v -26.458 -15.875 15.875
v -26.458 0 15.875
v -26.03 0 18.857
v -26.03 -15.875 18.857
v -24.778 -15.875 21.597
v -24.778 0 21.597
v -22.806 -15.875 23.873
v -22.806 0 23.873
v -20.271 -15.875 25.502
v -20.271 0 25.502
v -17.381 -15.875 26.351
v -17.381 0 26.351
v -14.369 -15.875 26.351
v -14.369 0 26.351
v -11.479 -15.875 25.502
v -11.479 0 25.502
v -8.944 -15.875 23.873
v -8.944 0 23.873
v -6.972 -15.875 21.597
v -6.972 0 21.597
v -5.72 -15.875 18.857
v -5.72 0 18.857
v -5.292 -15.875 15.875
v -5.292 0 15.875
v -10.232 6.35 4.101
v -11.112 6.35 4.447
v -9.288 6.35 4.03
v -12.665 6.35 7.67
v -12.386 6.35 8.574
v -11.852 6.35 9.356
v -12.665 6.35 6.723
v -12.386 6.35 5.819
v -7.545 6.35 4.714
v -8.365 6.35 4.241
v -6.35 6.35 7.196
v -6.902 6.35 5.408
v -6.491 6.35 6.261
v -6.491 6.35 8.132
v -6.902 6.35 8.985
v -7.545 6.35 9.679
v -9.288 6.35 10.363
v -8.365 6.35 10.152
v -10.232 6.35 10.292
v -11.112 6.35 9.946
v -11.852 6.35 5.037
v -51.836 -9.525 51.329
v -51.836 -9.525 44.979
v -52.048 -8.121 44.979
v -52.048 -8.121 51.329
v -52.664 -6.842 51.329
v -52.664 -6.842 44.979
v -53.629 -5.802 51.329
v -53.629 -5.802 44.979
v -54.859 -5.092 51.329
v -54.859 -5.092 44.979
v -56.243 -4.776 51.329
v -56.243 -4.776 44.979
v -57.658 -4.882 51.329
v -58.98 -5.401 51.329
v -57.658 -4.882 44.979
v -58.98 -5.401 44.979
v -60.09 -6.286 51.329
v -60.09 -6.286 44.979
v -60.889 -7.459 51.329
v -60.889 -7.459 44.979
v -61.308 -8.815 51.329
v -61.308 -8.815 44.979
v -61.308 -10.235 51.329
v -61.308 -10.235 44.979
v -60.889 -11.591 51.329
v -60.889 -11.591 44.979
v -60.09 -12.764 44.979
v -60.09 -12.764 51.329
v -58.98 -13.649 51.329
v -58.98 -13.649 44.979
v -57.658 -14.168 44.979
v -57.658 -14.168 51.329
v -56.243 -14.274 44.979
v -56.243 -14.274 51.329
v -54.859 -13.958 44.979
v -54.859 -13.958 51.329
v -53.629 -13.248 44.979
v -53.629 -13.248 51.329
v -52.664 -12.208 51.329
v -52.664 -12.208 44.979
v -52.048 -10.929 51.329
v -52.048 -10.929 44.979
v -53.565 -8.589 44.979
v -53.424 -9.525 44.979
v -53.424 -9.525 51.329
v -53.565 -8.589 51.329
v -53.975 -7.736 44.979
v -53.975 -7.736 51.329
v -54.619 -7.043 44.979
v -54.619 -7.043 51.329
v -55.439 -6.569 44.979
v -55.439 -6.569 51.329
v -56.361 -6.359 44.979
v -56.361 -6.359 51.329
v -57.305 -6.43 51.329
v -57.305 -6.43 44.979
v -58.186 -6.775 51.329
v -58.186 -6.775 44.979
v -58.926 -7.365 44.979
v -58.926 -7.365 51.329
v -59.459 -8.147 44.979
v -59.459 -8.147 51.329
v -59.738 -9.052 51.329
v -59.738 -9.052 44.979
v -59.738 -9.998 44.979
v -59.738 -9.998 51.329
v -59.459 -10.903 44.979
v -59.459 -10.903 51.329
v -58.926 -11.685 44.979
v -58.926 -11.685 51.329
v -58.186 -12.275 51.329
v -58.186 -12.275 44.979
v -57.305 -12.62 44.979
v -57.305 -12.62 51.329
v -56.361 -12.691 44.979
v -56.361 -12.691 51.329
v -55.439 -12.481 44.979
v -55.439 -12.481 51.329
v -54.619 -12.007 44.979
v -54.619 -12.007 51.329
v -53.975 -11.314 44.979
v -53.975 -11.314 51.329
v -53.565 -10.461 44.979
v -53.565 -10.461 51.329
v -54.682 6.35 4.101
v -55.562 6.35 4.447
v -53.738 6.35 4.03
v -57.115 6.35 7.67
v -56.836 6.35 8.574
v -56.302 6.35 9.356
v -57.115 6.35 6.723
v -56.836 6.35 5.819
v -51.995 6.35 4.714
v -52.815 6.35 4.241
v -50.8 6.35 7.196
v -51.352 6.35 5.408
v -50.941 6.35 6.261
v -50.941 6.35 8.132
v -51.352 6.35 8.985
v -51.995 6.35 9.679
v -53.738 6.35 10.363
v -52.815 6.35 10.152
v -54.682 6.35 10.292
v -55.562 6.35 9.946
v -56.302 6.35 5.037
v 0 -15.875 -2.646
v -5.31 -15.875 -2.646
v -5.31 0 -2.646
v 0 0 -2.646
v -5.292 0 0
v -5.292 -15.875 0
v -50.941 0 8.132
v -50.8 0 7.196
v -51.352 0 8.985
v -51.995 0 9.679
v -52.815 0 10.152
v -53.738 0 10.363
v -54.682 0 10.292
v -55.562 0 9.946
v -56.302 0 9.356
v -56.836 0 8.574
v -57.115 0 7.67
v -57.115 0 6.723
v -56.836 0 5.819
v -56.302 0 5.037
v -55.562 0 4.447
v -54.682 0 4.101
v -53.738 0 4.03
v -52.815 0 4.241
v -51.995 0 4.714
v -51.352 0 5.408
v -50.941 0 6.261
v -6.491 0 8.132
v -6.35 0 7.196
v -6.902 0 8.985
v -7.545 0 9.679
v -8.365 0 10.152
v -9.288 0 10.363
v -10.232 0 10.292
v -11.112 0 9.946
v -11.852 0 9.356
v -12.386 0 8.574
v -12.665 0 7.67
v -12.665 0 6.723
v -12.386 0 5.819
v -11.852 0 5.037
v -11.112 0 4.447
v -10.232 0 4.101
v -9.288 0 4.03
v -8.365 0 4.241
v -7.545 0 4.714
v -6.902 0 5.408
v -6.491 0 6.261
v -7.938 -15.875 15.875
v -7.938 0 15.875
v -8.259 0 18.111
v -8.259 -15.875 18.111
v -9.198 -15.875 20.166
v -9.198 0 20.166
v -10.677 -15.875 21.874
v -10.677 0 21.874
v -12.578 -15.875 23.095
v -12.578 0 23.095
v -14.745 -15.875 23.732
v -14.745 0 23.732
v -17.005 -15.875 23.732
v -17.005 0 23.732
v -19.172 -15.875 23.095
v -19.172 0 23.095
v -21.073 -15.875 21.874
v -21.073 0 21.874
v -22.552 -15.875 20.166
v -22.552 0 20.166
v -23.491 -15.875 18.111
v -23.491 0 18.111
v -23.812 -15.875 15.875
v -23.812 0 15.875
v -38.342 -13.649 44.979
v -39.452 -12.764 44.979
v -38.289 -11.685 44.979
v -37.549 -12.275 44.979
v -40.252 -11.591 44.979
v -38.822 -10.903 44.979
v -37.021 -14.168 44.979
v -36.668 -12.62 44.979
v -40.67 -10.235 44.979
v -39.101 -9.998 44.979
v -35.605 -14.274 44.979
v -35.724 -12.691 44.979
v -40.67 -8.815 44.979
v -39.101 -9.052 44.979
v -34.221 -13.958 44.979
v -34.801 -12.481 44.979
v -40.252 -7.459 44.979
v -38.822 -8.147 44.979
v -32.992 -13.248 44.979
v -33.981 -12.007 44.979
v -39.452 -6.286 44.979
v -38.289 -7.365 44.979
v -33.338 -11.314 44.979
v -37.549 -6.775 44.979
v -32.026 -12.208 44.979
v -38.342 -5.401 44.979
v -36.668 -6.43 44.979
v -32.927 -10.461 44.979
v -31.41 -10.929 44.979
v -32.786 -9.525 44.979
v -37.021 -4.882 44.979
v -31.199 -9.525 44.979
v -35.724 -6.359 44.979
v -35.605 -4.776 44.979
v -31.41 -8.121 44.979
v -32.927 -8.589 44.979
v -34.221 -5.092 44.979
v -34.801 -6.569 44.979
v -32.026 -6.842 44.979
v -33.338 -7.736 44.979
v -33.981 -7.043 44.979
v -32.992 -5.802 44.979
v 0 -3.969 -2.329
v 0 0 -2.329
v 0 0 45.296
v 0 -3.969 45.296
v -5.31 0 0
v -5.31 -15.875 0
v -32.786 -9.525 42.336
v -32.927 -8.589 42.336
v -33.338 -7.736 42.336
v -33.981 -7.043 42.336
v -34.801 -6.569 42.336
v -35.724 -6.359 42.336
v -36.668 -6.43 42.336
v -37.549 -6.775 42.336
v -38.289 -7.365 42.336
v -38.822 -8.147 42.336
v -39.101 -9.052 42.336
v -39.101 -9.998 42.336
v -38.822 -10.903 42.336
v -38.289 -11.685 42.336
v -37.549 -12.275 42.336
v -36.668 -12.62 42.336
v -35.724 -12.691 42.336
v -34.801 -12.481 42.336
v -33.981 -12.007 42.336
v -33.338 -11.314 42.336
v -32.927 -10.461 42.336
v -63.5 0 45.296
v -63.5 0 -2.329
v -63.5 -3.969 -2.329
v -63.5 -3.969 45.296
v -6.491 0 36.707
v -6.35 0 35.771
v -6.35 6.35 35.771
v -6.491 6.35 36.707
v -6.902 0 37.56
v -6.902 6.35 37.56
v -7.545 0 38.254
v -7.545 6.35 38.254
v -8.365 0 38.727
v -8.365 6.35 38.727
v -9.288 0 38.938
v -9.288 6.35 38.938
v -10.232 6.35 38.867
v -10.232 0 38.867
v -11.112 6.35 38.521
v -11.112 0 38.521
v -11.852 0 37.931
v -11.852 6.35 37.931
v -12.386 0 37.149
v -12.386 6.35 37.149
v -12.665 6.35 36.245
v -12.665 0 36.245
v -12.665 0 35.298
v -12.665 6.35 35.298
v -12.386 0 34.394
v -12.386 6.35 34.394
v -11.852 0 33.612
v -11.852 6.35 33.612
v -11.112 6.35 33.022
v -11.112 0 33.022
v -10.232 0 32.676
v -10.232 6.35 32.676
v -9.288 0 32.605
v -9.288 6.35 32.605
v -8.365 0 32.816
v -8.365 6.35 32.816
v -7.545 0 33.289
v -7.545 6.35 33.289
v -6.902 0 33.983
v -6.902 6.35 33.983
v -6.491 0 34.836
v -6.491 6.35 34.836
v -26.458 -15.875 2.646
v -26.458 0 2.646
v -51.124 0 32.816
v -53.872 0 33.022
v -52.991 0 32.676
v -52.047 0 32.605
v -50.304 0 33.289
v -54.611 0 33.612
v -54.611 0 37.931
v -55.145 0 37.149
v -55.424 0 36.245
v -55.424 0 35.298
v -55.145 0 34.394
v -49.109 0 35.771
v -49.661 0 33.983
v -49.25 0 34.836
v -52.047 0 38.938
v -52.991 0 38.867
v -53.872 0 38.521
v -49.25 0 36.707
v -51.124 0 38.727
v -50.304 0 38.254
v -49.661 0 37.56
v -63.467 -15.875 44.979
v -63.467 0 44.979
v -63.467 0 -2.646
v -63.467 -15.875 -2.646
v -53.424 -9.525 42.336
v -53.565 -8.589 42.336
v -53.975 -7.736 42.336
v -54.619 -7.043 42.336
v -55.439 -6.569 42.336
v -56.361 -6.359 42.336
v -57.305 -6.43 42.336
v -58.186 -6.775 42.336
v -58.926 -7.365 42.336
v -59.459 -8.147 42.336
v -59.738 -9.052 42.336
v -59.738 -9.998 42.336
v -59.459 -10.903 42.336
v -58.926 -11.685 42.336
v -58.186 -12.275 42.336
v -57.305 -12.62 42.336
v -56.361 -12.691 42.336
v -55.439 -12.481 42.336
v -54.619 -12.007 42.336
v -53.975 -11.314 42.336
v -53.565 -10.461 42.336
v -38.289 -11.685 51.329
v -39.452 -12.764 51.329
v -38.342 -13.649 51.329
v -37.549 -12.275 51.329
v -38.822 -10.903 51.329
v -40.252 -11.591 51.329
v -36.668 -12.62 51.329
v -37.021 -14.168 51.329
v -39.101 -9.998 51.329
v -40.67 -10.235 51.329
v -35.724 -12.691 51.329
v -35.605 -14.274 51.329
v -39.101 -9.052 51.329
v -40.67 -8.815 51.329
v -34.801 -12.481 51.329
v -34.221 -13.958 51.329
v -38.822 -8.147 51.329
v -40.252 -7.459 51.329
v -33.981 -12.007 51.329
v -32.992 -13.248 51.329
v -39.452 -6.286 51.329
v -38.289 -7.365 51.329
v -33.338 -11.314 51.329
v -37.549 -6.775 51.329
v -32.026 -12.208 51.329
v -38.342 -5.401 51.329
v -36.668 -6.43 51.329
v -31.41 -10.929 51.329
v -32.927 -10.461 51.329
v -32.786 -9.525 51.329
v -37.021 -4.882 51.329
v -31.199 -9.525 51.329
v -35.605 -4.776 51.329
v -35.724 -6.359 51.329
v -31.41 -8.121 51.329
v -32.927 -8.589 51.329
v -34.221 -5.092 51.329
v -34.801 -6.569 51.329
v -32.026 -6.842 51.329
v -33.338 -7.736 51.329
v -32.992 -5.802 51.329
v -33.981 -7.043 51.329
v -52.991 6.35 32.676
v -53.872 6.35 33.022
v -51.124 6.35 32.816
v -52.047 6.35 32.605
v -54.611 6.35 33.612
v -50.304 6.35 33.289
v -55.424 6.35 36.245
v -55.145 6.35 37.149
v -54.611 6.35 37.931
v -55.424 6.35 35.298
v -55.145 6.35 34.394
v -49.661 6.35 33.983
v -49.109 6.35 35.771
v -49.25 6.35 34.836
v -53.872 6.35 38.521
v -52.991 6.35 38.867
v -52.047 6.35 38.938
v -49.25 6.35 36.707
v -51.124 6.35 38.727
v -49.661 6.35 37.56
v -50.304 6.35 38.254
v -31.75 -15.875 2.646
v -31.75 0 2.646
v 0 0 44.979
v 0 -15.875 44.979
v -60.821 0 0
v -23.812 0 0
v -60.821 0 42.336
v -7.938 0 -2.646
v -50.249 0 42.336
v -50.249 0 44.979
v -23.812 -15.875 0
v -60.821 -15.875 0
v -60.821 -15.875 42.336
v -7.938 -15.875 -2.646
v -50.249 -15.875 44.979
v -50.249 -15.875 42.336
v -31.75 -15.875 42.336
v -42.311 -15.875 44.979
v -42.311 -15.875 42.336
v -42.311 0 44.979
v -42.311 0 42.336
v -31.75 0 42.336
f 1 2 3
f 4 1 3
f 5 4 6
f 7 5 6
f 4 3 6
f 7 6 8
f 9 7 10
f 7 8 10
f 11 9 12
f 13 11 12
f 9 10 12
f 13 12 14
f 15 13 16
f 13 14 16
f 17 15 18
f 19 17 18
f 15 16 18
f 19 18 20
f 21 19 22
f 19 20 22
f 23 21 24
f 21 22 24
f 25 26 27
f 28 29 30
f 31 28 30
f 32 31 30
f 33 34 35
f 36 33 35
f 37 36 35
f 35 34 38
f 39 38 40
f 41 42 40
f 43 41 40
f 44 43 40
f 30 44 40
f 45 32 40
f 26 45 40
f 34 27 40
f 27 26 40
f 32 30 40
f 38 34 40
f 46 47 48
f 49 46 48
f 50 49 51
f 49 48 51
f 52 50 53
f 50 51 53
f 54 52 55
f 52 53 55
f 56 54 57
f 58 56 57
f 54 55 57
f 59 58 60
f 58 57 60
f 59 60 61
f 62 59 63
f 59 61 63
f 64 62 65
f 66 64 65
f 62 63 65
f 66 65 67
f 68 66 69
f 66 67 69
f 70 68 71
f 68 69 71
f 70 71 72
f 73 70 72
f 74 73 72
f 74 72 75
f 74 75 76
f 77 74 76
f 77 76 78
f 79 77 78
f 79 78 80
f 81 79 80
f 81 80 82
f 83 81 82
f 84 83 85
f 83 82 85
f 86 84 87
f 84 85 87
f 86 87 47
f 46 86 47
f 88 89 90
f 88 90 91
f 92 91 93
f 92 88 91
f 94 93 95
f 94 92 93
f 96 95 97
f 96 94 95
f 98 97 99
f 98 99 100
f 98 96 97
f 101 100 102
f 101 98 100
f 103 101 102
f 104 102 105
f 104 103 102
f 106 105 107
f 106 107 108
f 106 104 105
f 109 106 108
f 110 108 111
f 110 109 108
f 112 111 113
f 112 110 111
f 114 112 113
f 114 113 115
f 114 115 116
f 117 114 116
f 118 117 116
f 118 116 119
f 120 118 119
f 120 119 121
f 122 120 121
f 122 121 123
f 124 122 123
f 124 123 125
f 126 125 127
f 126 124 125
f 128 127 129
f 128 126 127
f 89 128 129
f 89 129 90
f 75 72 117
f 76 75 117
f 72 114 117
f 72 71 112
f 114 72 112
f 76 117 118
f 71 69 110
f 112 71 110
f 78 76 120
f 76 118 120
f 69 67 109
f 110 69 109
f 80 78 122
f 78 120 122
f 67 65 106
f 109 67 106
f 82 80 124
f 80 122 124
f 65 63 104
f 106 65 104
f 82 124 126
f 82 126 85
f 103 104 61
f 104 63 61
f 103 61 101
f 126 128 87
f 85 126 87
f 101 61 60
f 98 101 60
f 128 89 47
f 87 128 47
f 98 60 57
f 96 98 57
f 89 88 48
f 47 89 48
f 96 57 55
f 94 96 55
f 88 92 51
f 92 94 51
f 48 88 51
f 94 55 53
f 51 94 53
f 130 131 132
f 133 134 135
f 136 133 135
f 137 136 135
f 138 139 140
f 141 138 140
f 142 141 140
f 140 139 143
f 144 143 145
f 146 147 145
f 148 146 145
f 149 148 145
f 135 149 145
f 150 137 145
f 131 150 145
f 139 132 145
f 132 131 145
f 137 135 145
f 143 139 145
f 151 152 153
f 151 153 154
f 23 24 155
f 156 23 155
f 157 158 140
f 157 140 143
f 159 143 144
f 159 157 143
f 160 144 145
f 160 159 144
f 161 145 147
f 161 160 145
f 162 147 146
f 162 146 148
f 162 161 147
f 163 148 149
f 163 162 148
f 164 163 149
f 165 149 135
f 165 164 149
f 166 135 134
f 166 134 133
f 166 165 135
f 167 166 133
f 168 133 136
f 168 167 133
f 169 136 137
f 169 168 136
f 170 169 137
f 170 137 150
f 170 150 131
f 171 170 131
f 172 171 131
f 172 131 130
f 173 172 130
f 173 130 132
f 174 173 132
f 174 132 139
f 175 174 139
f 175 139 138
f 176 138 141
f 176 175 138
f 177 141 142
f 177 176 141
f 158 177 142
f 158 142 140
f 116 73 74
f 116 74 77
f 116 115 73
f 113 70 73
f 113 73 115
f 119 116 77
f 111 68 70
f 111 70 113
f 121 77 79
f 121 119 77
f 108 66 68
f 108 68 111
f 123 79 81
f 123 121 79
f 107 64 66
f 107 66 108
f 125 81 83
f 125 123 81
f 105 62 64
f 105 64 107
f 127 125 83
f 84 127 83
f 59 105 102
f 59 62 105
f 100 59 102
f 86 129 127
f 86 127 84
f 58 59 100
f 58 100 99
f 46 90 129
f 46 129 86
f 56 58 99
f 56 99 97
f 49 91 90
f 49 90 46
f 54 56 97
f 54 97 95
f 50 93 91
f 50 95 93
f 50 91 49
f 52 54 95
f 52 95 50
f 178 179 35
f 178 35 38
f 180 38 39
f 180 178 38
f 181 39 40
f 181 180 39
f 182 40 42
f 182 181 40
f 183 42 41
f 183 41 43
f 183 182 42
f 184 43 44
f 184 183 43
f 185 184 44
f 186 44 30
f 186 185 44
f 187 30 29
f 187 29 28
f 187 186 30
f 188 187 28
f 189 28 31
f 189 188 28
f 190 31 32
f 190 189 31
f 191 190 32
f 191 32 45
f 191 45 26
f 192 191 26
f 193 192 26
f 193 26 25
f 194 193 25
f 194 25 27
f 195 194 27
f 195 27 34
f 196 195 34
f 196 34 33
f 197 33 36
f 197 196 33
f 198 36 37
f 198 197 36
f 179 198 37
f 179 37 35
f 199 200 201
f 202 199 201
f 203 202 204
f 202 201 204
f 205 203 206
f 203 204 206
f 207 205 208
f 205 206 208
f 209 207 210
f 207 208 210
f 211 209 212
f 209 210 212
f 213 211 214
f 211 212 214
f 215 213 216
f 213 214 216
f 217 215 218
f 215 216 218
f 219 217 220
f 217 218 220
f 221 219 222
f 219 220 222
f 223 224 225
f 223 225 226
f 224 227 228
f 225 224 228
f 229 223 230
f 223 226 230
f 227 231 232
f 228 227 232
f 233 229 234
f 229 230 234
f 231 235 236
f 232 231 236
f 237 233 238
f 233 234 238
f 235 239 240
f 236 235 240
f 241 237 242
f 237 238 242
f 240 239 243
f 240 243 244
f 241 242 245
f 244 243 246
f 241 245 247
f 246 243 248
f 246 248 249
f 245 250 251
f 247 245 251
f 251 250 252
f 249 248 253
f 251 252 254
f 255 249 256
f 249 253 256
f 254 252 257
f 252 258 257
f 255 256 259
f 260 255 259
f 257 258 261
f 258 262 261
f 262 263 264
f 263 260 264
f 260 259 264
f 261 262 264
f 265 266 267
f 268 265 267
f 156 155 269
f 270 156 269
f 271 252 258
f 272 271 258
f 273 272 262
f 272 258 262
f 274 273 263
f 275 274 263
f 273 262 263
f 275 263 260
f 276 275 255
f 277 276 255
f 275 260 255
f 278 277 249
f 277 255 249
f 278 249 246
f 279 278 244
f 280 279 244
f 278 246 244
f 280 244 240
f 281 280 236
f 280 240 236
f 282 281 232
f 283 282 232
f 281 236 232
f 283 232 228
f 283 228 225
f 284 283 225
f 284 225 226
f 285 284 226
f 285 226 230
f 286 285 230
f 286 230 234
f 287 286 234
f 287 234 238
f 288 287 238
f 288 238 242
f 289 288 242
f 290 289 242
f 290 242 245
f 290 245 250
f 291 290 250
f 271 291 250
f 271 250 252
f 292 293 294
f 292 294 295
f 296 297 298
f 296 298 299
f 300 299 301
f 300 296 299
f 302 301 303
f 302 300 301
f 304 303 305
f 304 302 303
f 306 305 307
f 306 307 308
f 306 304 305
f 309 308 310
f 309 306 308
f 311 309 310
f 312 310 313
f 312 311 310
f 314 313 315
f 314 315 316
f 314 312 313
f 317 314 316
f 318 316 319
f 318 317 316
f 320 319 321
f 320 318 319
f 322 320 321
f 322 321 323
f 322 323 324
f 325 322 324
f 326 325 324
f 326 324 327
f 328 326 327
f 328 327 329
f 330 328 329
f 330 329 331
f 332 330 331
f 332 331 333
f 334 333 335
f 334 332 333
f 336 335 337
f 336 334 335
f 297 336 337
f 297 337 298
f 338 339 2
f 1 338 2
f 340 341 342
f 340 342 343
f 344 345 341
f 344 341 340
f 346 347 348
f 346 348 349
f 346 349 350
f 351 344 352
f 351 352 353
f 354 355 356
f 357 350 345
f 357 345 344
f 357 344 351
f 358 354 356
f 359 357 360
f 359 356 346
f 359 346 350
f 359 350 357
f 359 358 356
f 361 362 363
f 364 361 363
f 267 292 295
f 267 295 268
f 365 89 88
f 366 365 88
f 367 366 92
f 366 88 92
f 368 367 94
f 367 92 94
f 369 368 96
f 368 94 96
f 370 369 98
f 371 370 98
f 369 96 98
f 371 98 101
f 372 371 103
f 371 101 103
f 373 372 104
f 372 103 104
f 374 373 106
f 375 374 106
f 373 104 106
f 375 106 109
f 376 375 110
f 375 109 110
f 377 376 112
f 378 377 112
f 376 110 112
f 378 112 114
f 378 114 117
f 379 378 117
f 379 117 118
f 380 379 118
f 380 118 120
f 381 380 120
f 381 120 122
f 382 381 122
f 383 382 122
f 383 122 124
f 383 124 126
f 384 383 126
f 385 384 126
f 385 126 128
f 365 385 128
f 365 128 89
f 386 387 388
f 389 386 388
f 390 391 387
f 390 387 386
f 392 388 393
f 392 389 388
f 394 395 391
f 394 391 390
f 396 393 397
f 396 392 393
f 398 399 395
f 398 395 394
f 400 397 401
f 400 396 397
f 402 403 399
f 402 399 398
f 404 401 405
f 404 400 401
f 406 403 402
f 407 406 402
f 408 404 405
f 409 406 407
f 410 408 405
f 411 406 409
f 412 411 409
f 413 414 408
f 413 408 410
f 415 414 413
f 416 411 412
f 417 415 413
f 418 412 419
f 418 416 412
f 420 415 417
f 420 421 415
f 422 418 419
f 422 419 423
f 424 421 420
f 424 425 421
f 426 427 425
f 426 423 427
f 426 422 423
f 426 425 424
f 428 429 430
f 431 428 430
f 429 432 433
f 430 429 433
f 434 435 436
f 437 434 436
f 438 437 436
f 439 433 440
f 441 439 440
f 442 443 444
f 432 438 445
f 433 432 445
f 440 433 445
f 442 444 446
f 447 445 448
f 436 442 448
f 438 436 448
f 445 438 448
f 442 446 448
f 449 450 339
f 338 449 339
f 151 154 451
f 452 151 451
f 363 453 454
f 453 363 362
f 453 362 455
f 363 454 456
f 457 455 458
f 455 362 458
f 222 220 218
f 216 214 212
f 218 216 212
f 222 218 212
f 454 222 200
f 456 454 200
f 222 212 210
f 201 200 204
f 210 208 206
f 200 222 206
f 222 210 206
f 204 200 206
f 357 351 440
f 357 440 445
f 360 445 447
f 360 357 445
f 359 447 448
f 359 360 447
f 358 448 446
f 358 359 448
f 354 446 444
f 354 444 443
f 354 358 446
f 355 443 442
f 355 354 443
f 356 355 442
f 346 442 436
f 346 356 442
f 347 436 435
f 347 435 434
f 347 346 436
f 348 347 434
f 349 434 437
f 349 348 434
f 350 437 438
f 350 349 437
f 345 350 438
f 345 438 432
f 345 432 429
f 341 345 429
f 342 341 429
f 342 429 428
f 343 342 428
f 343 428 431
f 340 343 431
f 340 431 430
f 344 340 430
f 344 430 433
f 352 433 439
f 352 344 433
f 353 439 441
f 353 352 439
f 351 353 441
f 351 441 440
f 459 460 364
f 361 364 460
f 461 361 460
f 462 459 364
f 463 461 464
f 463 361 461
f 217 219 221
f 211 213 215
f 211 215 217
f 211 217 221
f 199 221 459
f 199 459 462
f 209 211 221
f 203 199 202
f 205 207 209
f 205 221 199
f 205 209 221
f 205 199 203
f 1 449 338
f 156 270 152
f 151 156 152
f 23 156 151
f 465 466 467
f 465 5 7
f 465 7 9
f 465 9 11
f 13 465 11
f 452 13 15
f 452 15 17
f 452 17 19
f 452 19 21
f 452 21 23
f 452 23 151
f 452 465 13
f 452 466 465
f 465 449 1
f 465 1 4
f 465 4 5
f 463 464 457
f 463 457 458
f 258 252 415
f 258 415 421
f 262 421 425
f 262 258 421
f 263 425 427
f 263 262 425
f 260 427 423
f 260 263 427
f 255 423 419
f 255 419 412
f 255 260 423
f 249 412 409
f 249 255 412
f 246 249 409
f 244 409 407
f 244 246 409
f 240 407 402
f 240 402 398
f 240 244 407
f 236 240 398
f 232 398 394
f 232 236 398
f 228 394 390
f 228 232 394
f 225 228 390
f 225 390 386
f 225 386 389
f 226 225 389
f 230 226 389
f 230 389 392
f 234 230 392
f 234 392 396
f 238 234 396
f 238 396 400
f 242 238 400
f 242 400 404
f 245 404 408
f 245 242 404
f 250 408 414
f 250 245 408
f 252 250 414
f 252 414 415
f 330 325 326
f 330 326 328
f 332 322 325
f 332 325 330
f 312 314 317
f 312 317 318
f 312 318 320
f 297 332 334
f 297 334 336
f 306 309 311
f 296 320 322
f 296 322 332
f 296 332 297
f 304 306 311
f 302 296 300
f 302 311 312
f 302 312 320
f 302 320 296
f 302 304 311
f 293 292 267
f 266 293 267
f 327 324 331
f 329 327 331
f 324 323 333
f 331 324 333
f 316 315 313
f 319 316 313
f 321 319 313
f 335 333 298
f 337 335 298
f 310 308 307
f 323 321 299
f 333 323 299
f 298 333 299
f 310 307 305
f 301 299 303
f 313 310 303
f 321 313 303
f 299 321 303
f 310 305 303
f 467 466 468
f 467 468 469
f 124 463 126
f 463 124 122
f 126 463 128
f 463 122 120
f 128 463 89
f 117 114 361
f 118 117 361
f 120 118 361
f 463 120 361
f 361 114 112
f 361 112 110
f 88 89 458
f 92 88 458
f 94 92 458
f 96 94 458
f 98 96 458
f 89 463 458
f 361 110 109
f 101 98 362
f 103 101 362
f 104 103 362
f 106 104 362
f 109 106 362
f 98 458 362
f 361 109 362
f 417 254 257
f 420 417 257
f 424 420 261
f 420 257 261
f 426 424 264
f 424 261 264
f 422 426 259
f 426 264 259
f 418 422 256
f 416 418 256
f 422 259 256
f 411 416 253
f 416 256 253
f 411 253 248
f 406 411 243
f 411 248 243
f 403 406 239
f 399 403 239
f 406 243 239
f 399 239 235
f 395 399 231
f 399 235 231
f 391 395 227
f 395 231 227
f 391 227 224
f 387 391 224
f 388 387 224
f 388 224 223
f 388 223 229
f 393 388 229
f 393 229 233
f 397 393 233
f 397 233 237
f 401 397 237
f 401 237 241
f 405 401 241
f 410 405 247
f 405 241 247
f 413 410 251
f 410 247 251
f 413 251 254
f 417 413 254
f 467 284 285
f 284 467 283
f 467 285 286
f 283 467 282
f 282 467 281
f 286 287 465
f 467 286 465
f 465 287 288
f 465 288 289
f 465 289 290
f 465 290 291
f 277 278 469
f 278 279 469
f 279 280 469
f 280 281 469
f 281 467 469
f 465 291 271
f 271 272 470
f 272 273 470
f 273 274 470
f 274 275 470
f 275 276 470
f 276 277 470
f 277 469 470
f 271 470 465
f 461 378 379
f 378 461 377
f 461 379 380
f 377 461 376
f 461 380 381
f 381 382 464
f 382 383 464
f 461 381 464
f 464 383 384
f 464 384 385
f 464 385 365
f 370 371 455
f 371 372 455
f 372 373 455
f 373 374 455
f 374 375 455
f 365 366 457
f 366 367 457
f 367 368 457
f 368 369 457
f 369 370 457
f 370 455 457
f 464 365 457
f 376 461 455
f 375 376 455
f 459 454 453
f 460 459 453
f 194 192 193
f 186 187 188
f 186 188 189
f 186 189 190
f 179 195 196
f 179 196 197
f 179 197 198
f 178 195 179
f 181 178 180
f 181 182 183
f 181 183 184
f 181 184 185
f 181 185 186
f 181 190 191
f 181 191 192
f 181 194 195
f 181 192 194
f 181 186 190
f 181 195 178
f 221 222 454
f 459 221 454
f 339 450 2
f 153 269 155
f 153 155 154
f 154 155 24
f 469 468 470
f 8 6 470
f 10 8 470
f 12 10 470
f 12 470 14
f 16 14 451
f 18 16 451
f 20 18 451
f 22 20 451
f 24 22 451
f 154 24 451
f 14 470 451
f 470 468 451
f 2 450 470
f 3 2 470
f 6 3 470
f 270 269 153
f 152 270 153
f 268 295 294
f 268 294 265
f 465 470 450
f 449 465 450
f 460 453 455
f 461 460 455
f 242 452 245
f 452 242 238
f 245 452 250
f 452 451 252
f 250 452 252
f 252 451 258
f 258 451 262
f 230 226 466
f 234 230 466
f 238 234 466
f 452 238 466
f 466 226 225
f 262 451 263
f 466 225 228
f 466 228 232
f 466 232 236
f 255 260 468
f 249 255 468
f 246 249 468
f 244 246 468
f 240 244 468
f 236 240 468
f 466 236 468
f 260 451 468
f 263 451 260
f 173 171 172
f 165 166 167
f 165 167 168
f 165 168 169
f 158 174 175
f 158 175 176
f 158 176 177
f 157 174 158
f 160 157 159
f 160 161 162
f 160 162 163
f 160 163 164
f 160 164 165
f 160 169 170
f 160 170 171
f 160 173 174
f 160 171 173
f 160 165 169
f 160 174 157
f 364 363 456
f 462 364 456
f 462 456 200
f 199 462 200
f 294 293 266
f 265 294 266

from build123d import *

# Parameters (mm, degrees)
F1_DEPTH = 15.875
F0_W     = 2.6458333332
F0_H     = 42.3358732487
F2_W     = 63.5
F2_H     = 47.625
F2_R     = 3.175
F3_DEPTH = 3.96875
F4_DEPTH = 6.35
F5_R     = 4.7625
F5_R_2   = 3.175
F6_DEPTH = 6.35
F7_R     = 3.175
F8_DEPTH = 25.4


# Not quite as in the source:
# - a feature names something its author has since deleted; it is built from what else it names


with BuildPart() as f1:
    # F0 (on Front) → F1 (new body)
    with BuildSketch(Plane.XZ):
        with BuildLine():
            Line((0, 44.979166582), (-31.75, 44.979166582))
            Line((-31.75, 44.979166582), (-31.75, 42.3358732487))
            Line((-31.75, 42.3358732487), (-31.75, 2.6458333332))
            Line((-31.75, 2.6458333332), (-26.4583333333, 2.6458333332))
            Line((-26.4583333333, 2.6458333332), (-26.4583333333, 15.875))
            ThreePointArc((-26.4583333333, 15.875), (-15.875, 26.4583333333), (-5.2916666667, 15.875))
            Line((-5.2916666667, 15.875), (-5.2916666667, 0))
            Line((-5.2916666667, 0), (0, 0))
            Line((0, 0), (0, 44.979166582))
        make_face()
        Polygon((0, -2.6458333333), (0, 0), (-5.2916666667, 0), (-5.309548229, 0), (-5.309548229, -2.6458333333), align=None)
        Polygon((-31.75, 42.3358732487), (-31.75, 44.979166582), (-34.3958333316, 44.979166582), (-37.0416664956, 44.979166582), (-42.3110765377, 44.979166582), (-42.3110765377, 42.3358732487), (-37.0416664956, 42.3358732487), (-34.3958333316, 42.3358732487), align=None)
    extrude(amount=F1_DEPTH)


with BuildPart() as f1b:
    # F0 (on Front) → F1, piece 2 (new body)
    with BuildSketch(Plane.XZ):
        with BuildLine():
            Line((-23.8125, 0), (-7.9375, 0))
            Line((-7.9375, 0), (-7.9375, 15.875))
            ThreePointArc((-7.9375, 15.875), (-15.875, 23.8125), (-23.8125, 15.875))
            Line((-23.8125, 15.875), (-23.8125, 0))
        make_face()
        Polygon((-26.4583333333, 0), (-31.75, 0), (-60.8213265341, 0), (-63.4671598673, 0), (-63.4671598673, -2.6458333333), (-7.9375, -2.6458333333), (-7.9375, 0), (-23.8125, 0), align=None)
        with Locations((-62.1442432007, 21.1679366243)):
            Rectangle(F0_W, F0_H)
        Polygon((-50.2485765377, 42.3358732487), (-50.2485765377, 44.979166582), (-55.5296598693, 44.979166582), (-58.175493201, 44.979166582), (-63.4671598673, 44.979166582), (-63.4671598673, 42.3358732487), (-60.8213265341, 42.3358732487), (-58.175493201, 42.3358732487), (-55.5296598693, 42.3358732487), align=None)
    extrude(amount=F1_DEPTH)


with BuildPart() as f3:
    # F2 (on Front) → F3 (new body)
    with BuildSketch(Plane.XZ):
        with Locations((-31.75, 21.4839725468)):
            Rectangle(F2_W, F2_H)
        with Locations((-53.975, 7.1964725468)):
            Circle(F2_R, mode=Mode.SUBTRACT)
        with Locations((-9.525, 7.1964725468)):
            Circle(F2_R, mode=Mode.SUBTRACT)
        with Locations((-52.284011212, 35.7714725468)):
            Circle(F2_R, mode=Mode.SUBTRACT)
        with Locations((-9.525, 35.7714725468)):
            Circle(F2_R, mode=Mode.SUBTRACT)
        with Locations((-52.284011212, 35.7714725468)):
            Circle(F2_R)
        with Locations((-53.975, 7.1964725468)):
            Circle(F2_R)
        with Locations((-9.525, 7.1964725468)):
            Circle(F2_R)
        with Locations((-9.525, 35.7714725468)):
            Circle(F2_R)
    extrude(amount=F3_DEPTH)


with BuildPart() as f4:
    # F2 (on Front) → F4 (new body)
    with BuildSketch(Plane.XZ):
        with Locations((-9.525, 35.7714725468)):
            Circle(F2_R)
    extrude(amount=-F4_DEPTH)


with BuildPart() as f4b:
    # F2 (on Front) → F4, piece 2 (new body)
    with BuildSketch(Plane.XZ):
        with Locations((-52.284011212, 35.7714725468)):
            Circle(F2_R)
    extrude(amount=-F4_DEPTH)


with BuildPart() as f4c:
    # F2 (on Front) → F4, piece 3 (new body)
    with BuildSketch(Plane.XZ):
        with Locations((-9.525, 7.1964725468)):
            Circle(F2_R)
    extrude(amount=-F4_DEPTH)


with BuildPart() as f4d:
    # F2 (on Front) → F4, piece 4 (new body)
    with BuildSketch(Plane.XZ):
        with Locations((-53.975, 7.1964725468)):
            Circle(F2_R)
    extrude(amount=-F4_DEPTH)


with BuildPart() as f6:
    # F5 (on face) → F6 (new body)
    with BuildSketch(Plane.XY.offset(44.979166582)):
        with Locations((-56.5985765377, -9.525)):
            Circle(F5_R)
        with Locations((-56.5985765377, -9.525)):
            Circle(F5_R_2, mode=Mode.SUBTRACT)
    extrude(amount=F6_DEPTH)


with BuildPart() as f6b:
    # F5 (on face) → F6, piece 2 (new body)
    with BuildSketch(Plane.XY.offset(44.979166582)):
        with Locations((-35.9610765377, -9.525)):
            Circle(F5_R)
        with Locations((-35.9610765377, -9.525)):
            Circle(F5_R_2, mode=Mode.SUBTRACT)
    extrude(amount=F6_DEPTH)


with BuildPart() as f8_tool:
    # F7 (on face) → F8 (new body)
    with BuildSketch(Plane.XY.offset(44.979166582)):
        with Locations((-35.9610765377, -9.525)):
            Circle(F7_R)
        with Locations((-56.5985765377, -9.525)):
            Circle(F7_R)
    extrude(amount=-F8_DEPTH)


with BuildPart() as f1_1:
    add(f1.part)

    # F8: cut by f8_tool
    add(f8_tool.part, mode=Mode.SUBTRACT)


with BuildPart() as f1b_1:
    add(f1b.part)

    # F8: cut by f8_tool
    add(f8_tool.part, mode=Mode.SUBTRACT)


solid = Compound([f3.part, f4.part, f4b.part, f4c.part, f4d.part, f6.part, f6b.part, f1_1.part, f1b_1.part])
